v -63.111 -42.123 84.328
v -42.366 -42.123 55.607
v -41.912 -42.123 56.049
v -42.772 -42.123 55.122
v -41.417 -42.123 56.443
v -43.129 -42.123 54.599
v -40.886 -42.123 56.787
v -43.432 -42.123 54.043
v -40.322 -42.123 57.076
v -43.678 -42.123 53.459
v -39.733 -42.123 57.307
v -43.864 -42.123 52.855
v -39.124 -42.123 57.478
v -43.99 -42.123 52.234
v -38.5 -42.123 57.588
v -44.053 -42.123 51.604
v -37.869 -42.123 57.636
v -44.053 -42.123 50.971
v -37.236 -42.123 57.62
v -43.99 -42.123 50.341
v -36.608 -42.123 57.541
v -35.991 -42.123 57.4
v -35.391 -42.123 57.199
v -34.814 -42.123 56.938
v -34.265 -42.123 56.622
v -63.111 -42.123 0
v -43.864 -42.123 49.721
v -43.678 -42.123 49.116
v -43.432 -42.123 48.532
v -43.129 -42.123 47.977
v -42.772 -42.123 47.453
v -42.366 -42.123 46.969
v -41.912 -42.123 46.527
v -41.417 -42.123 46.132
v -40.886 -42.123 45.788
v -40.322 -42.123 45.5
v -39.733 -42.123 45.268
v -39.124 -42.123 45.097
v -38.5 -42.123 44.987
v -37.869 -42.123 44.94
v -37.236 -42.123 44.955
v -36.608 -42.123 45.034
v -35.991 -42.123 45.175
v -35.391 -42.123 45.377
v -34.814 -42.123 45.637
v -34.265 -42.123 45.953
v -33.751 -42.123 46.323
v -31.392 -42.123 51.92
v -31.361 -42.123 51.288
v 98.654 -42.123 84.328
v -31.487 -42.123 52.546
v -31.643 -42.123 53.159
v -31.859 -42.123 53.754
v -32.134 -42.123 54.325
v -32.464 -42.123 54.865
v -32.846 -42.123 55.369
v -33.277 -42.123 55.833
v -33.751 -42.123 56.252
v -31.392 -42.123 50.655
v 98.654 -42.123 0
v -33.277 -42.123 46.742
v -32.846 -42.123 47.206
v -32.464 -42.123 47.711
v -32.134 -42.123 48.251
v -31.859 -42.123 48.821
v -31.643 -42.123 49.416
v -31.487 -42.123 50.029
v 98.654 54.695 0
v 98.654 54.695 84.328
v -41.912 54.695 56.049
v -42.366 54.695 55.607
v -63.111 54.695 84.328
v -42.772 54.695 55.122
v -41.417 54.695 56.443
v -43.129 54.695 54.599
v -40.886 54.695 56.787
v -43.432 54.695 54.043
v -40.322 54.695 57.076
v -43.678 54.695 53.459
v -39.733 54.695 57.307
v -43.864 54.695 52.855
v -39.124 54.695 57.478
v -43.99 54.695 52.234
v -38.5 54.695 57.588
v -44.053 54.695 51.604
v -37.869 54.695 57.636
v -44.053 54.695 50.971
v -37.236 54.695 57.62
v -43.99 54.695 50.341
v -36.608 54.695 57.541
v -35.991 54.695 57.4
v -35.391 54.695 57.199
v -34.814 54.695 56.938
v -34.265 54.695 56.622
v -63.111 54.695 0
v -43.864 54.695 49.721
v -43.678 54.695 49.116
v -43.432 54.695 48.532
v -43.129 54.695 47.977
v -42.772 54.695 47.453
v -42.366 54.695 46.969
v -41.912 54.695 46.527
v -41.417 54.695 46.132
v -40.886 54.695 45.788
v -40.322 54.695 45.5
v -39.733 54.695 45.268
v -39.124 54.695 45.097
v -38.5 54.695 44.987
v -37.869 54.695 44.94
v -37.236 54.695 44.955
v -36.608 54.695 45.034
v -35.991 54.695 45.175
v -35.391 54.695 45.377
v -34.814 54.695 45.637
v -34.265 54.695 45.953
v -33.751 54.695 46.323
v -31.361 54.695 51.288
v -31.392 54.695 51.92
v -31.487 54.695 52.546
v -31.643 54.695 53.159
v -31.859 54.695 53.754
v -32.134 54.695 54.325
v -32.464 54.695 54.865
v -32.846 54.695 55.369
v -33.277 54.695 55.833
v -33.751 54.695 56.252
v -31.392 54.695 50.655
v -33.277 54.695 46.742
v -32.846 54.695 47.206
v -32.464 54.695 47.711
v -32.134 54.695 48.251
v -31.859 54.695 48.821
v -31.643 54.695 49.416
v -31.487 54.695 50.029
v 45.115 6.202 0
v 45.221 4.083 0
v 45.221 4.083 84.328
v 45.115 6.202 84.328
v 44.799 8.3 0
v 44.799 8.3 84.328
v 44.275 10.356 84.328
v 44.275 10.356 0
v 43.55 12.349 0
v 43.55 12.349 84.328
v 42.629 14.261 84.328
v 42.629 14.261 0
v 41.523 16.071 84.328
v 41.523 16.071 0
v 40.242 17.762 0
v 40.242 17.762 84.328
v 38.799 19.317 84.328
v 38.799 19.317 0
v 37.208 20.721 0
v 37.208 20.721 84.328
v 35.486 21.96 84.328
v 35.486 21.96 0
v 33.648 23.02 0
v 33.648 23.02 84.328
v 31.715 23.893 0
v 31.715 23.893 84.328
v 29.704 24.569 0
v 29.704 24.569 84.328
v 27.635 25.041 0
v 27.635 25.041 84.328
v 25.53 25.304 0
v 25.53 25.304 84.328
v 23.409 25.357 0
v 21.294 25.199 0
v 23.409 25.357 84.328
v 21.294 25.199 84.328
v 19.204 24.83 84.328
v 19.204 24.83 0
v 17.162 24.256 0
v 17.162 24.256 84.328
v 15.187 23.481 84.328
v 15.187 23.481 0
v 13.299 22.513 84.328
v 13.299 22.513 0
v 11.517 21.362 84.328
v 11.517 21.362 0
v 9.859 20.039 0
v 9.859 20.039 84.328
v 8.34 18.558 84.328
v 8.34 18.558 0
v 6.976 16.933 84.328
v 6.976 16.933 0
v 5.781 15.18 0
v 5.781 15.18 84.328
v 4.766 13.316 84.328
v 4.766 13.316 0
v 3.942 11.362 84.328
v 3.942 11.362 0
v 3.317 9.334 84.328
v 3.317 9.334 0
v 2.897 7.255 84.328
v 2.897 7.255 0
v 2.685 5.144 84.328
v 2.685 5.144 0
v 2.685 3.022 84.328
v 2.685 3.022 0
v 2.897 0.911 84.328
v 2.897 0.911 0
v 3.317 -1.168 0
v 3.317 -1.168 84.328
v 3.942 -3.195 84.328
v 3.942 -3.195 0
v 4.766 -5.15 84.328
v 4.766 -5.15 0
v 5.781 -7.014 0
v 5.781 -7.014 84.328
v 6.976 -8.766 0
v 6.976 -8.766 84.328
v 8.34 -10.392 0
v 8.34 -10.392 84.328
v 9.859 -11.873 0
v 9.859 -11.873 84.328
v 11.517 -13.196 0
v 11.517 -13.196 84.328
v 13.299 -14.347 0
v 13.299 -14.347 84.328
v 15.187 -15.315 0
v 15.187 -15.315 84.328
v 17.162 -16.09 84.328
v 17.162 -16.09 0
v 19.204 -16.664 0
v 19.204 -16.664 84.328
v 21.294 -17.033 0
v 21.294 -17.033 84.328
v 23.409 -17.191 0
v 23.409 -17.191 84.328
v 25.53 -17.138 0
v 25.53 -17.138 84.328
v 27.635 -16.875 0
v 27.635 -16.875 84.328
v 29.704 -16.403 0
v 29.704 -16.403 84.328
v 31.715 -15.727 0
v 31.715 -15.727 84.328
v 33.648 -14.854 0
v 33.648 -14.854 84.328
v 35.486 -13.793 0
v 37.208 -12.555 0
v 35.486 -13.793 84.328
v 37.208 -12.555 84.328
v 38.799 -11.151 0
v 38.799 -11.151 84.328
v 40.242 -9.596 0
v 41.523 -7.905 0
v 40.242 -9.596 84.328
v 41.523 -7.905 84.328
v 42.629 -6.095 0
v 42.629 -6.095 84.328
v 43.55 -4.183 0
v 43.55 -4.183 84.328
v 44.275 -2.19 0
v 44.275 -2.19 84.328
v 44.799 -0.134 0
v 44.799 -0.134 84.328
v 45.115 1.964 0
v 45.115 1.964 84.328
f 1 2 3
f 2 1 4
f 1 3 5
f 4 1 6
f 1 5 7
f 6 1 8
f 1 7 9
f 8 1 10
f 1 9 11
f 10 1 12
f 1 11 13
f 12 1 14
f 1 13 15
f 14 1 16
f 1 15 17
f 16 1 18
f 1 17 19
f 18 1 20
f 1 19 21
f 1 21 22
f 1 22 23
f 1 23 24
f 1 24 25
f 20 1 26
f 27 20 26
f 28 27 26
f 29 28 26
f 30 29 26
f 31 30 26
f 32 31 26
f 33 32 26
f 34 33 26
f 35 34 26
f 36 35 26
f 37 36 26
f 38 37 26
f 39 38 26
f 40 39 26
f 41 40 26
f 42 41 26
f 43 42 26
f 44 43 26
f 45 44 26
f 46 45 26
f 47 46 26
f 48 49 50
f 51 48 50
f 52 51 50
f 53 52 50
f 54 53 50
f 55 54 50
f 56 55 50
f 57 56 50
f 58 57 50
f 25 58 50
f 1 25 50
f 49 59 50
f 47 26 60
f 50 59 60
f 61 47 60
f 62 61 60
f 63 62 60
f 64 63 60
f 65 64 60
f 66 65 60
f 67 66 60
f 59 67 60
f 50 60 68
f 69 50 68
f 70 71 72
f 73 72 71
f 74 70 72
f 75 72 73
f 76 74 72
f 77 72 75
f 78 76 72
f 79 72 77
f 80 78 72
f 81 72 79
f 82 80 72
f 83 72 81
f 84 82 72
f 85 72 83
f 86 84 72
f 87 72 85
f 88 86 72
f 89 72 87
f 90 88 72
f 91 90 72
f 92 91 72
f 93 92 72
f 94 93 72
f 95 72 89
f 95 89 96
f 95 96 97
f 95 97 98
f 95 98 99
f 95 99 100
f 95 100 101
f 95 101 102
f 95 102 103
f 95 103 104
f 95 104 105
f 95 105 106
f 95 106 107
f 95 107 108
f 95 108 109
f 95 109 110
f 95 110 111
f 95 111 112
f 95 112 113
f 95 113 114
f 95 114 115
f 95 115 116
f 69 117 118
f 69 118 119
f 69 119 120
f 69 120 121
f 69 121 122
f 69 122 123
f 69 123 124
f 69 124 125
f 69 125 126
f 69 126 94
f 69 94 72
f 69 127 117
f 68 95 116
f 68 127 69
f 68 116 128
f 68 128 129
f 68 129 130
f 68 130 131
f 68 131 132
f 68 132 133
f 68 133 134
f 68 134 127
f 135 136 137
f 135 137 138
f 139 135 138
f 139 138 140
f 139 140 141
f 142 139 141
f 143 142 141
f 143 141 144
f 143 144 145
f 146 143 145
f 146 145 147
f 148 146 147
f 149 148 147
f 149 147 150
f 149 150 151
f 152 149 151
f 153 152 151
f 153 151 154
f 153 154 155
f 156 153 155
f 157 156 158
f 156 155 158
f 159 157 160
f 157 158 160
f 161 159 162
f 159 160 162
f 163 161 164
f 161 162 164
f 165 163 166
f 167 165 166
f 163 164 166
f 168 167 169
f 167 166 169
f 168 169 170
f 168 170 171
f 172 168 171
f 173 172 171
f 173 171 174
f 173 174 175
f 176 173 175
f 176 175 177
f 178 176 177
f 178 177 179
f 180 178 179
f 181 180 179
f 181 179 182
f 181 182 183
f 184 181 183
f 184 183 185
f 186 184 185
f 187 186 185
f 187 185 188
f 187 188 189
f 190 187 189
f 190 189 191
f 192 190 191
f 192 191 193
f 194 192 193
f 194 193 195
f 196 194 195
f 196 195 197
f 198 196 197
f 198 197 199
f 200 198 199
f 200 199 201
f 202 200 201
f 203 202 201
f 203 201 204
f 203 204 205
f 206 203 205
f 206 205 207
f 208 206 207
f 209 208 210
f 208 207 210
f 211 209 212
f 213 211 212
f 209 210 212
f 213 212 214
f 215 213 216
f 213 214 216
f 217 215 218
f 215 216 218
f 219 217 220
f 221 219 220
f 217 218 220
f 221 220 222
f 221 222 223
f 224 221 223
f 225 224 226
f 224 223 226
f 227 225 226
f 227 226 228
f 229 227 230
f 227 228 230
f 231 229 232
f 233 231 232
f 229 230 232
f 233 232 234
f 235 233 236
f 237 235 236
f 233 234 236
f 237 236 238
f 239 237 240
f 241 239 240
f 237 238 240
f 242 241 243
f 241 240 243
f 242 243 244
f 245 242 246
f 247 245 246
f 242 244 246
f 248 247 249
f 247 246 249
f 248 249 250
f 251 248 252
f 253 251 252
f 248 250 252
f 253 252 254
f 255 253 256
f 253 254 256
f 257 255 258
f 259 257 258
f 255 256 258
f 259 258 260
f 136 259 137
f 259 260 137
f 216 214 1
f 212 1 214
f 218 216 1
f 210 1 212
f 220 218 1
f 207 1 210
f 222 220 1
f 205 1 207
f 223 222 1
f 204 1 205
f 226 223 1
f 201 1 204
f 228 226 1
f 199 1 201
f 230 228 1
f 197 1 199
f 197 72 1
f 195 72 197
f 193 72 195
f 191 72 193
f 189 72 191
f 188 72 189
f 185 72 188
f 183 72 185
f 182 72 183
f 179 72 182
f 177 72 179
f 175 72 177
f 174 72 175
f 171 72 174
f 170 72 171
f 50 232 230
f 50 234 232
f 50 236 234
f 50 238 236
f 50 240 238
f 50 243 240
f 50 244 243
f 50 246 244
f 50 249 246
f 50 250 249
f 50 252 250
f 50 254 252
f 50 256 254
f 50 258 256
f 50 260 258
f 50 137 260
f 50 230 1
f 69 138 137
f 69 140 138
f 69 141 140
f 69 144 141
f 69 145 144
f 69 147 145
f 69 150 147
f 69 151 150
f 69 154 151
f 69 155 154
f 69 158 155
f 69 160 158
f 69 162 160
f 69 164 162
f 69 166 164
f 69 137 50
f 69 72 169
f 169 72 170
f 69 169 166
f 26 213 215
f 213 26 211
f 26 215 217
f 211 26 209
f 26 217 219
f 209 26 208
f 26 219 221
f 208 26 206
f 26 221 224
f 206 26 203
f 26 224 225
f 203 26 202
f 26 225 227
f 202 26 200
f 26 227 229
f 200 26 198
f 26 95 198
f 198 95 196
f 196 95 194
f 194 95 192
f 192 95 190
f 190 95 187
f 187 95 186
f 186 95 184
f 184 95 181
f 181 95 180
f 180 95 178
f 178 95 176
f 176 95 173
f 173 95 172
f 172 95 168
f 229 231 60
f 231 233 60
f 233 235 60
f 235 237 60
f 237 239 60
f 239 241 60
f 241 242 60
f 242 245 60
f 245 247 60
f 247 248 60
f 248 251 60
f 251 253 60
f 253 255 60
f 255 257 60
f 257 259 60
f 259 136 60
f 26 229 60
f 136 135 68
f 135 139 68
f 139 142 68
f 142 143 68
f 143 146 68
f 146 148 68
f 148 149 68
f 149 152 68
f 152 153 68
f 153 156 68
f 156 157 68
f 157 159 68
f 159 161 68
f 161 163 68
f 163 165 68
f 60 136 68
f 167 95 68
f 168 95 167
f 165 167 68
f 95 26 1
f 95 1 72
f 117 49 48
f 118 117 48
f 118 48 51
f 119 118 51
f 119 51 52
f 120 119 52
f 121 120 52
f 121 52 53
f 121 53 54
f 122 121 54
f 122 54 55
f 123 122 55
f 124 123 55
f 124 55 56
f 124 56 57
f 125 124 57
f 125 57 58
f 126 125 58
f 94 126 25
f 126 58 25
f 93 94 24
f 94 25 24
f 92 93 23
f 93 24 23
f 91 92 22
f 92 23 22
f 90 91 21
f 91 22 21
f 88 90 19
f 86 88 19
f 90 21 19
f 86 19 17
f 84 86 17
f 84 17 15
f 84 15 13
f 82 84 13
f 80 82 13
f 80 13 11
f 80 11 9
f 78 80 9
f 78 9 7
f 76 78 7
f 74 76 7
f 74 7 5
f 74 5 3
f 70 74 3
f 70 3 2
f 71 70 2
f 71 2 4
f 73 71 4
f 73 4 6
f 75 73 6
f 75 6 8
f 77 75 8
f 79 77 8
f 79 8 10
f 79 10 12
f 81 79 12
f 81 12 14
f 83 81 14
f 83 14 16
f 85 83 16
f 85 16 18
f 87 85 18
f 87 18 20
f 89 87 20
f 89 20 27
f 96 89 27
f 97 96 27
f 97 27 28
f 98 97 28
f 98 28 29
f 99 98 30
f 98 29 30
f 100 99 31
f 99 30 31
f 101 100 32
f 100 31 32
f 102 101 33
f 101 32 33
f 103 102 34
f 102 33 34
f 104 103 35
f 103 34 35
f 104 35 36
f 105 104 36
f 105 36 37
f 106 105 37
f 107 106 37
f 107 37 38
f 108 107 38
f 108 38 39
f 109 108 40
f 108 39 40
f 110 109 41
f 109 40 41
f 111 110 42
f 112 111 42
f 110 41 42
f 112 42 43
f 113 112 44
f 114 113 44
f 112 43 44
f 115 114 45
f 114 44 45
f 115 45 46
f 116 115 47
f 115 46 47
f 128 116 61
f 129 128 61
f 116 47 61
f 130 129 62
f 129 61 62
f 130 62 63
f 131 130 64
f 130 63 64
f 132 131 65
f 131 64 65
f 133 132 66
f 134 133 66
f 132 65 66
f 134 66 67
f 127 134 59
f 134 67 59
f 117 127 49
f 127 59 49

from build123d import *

# Parameters (mm, degrees)
F0_W     = 161.764927
F0_H     = 96.818306
F1_DEPTH = 84.328
F2_R     = 21.280915
F3_DEPTH = 84.329
F4_R     = 6.35
F5_DEPTH = 96.819306


with BuildPart() as f1:
    # F0 (on Top) → F1 (new body)
    with BuildSketch(Plane.XY):
        with Locations((17.771822, 6.286327)):
            Rectangle(F0_W, F0_H)
    extrude(amount=F1_DEPTH)

    # F2 (on face) → F3 (cut, through all)
    with BuildSketch(Plane.XY.offset(84.328)):
        with Locations((23.939807, 4.083021)):
            Circle(F2_R)
    extrude(amount=-F3_DEPTH, mode=Mode.SUBTRACT)

    # F4 (on face) → F5 (cut, through all)
    with BuildSketch(Plane.XZ.offset(42.122826)):
        with Locations((-37.710642, 51.287621)):
            Circle(F4_R)
    extrude(amount=-F5_DEPTH, mode=Mode.SUBTRACT)


solid = f1.part
